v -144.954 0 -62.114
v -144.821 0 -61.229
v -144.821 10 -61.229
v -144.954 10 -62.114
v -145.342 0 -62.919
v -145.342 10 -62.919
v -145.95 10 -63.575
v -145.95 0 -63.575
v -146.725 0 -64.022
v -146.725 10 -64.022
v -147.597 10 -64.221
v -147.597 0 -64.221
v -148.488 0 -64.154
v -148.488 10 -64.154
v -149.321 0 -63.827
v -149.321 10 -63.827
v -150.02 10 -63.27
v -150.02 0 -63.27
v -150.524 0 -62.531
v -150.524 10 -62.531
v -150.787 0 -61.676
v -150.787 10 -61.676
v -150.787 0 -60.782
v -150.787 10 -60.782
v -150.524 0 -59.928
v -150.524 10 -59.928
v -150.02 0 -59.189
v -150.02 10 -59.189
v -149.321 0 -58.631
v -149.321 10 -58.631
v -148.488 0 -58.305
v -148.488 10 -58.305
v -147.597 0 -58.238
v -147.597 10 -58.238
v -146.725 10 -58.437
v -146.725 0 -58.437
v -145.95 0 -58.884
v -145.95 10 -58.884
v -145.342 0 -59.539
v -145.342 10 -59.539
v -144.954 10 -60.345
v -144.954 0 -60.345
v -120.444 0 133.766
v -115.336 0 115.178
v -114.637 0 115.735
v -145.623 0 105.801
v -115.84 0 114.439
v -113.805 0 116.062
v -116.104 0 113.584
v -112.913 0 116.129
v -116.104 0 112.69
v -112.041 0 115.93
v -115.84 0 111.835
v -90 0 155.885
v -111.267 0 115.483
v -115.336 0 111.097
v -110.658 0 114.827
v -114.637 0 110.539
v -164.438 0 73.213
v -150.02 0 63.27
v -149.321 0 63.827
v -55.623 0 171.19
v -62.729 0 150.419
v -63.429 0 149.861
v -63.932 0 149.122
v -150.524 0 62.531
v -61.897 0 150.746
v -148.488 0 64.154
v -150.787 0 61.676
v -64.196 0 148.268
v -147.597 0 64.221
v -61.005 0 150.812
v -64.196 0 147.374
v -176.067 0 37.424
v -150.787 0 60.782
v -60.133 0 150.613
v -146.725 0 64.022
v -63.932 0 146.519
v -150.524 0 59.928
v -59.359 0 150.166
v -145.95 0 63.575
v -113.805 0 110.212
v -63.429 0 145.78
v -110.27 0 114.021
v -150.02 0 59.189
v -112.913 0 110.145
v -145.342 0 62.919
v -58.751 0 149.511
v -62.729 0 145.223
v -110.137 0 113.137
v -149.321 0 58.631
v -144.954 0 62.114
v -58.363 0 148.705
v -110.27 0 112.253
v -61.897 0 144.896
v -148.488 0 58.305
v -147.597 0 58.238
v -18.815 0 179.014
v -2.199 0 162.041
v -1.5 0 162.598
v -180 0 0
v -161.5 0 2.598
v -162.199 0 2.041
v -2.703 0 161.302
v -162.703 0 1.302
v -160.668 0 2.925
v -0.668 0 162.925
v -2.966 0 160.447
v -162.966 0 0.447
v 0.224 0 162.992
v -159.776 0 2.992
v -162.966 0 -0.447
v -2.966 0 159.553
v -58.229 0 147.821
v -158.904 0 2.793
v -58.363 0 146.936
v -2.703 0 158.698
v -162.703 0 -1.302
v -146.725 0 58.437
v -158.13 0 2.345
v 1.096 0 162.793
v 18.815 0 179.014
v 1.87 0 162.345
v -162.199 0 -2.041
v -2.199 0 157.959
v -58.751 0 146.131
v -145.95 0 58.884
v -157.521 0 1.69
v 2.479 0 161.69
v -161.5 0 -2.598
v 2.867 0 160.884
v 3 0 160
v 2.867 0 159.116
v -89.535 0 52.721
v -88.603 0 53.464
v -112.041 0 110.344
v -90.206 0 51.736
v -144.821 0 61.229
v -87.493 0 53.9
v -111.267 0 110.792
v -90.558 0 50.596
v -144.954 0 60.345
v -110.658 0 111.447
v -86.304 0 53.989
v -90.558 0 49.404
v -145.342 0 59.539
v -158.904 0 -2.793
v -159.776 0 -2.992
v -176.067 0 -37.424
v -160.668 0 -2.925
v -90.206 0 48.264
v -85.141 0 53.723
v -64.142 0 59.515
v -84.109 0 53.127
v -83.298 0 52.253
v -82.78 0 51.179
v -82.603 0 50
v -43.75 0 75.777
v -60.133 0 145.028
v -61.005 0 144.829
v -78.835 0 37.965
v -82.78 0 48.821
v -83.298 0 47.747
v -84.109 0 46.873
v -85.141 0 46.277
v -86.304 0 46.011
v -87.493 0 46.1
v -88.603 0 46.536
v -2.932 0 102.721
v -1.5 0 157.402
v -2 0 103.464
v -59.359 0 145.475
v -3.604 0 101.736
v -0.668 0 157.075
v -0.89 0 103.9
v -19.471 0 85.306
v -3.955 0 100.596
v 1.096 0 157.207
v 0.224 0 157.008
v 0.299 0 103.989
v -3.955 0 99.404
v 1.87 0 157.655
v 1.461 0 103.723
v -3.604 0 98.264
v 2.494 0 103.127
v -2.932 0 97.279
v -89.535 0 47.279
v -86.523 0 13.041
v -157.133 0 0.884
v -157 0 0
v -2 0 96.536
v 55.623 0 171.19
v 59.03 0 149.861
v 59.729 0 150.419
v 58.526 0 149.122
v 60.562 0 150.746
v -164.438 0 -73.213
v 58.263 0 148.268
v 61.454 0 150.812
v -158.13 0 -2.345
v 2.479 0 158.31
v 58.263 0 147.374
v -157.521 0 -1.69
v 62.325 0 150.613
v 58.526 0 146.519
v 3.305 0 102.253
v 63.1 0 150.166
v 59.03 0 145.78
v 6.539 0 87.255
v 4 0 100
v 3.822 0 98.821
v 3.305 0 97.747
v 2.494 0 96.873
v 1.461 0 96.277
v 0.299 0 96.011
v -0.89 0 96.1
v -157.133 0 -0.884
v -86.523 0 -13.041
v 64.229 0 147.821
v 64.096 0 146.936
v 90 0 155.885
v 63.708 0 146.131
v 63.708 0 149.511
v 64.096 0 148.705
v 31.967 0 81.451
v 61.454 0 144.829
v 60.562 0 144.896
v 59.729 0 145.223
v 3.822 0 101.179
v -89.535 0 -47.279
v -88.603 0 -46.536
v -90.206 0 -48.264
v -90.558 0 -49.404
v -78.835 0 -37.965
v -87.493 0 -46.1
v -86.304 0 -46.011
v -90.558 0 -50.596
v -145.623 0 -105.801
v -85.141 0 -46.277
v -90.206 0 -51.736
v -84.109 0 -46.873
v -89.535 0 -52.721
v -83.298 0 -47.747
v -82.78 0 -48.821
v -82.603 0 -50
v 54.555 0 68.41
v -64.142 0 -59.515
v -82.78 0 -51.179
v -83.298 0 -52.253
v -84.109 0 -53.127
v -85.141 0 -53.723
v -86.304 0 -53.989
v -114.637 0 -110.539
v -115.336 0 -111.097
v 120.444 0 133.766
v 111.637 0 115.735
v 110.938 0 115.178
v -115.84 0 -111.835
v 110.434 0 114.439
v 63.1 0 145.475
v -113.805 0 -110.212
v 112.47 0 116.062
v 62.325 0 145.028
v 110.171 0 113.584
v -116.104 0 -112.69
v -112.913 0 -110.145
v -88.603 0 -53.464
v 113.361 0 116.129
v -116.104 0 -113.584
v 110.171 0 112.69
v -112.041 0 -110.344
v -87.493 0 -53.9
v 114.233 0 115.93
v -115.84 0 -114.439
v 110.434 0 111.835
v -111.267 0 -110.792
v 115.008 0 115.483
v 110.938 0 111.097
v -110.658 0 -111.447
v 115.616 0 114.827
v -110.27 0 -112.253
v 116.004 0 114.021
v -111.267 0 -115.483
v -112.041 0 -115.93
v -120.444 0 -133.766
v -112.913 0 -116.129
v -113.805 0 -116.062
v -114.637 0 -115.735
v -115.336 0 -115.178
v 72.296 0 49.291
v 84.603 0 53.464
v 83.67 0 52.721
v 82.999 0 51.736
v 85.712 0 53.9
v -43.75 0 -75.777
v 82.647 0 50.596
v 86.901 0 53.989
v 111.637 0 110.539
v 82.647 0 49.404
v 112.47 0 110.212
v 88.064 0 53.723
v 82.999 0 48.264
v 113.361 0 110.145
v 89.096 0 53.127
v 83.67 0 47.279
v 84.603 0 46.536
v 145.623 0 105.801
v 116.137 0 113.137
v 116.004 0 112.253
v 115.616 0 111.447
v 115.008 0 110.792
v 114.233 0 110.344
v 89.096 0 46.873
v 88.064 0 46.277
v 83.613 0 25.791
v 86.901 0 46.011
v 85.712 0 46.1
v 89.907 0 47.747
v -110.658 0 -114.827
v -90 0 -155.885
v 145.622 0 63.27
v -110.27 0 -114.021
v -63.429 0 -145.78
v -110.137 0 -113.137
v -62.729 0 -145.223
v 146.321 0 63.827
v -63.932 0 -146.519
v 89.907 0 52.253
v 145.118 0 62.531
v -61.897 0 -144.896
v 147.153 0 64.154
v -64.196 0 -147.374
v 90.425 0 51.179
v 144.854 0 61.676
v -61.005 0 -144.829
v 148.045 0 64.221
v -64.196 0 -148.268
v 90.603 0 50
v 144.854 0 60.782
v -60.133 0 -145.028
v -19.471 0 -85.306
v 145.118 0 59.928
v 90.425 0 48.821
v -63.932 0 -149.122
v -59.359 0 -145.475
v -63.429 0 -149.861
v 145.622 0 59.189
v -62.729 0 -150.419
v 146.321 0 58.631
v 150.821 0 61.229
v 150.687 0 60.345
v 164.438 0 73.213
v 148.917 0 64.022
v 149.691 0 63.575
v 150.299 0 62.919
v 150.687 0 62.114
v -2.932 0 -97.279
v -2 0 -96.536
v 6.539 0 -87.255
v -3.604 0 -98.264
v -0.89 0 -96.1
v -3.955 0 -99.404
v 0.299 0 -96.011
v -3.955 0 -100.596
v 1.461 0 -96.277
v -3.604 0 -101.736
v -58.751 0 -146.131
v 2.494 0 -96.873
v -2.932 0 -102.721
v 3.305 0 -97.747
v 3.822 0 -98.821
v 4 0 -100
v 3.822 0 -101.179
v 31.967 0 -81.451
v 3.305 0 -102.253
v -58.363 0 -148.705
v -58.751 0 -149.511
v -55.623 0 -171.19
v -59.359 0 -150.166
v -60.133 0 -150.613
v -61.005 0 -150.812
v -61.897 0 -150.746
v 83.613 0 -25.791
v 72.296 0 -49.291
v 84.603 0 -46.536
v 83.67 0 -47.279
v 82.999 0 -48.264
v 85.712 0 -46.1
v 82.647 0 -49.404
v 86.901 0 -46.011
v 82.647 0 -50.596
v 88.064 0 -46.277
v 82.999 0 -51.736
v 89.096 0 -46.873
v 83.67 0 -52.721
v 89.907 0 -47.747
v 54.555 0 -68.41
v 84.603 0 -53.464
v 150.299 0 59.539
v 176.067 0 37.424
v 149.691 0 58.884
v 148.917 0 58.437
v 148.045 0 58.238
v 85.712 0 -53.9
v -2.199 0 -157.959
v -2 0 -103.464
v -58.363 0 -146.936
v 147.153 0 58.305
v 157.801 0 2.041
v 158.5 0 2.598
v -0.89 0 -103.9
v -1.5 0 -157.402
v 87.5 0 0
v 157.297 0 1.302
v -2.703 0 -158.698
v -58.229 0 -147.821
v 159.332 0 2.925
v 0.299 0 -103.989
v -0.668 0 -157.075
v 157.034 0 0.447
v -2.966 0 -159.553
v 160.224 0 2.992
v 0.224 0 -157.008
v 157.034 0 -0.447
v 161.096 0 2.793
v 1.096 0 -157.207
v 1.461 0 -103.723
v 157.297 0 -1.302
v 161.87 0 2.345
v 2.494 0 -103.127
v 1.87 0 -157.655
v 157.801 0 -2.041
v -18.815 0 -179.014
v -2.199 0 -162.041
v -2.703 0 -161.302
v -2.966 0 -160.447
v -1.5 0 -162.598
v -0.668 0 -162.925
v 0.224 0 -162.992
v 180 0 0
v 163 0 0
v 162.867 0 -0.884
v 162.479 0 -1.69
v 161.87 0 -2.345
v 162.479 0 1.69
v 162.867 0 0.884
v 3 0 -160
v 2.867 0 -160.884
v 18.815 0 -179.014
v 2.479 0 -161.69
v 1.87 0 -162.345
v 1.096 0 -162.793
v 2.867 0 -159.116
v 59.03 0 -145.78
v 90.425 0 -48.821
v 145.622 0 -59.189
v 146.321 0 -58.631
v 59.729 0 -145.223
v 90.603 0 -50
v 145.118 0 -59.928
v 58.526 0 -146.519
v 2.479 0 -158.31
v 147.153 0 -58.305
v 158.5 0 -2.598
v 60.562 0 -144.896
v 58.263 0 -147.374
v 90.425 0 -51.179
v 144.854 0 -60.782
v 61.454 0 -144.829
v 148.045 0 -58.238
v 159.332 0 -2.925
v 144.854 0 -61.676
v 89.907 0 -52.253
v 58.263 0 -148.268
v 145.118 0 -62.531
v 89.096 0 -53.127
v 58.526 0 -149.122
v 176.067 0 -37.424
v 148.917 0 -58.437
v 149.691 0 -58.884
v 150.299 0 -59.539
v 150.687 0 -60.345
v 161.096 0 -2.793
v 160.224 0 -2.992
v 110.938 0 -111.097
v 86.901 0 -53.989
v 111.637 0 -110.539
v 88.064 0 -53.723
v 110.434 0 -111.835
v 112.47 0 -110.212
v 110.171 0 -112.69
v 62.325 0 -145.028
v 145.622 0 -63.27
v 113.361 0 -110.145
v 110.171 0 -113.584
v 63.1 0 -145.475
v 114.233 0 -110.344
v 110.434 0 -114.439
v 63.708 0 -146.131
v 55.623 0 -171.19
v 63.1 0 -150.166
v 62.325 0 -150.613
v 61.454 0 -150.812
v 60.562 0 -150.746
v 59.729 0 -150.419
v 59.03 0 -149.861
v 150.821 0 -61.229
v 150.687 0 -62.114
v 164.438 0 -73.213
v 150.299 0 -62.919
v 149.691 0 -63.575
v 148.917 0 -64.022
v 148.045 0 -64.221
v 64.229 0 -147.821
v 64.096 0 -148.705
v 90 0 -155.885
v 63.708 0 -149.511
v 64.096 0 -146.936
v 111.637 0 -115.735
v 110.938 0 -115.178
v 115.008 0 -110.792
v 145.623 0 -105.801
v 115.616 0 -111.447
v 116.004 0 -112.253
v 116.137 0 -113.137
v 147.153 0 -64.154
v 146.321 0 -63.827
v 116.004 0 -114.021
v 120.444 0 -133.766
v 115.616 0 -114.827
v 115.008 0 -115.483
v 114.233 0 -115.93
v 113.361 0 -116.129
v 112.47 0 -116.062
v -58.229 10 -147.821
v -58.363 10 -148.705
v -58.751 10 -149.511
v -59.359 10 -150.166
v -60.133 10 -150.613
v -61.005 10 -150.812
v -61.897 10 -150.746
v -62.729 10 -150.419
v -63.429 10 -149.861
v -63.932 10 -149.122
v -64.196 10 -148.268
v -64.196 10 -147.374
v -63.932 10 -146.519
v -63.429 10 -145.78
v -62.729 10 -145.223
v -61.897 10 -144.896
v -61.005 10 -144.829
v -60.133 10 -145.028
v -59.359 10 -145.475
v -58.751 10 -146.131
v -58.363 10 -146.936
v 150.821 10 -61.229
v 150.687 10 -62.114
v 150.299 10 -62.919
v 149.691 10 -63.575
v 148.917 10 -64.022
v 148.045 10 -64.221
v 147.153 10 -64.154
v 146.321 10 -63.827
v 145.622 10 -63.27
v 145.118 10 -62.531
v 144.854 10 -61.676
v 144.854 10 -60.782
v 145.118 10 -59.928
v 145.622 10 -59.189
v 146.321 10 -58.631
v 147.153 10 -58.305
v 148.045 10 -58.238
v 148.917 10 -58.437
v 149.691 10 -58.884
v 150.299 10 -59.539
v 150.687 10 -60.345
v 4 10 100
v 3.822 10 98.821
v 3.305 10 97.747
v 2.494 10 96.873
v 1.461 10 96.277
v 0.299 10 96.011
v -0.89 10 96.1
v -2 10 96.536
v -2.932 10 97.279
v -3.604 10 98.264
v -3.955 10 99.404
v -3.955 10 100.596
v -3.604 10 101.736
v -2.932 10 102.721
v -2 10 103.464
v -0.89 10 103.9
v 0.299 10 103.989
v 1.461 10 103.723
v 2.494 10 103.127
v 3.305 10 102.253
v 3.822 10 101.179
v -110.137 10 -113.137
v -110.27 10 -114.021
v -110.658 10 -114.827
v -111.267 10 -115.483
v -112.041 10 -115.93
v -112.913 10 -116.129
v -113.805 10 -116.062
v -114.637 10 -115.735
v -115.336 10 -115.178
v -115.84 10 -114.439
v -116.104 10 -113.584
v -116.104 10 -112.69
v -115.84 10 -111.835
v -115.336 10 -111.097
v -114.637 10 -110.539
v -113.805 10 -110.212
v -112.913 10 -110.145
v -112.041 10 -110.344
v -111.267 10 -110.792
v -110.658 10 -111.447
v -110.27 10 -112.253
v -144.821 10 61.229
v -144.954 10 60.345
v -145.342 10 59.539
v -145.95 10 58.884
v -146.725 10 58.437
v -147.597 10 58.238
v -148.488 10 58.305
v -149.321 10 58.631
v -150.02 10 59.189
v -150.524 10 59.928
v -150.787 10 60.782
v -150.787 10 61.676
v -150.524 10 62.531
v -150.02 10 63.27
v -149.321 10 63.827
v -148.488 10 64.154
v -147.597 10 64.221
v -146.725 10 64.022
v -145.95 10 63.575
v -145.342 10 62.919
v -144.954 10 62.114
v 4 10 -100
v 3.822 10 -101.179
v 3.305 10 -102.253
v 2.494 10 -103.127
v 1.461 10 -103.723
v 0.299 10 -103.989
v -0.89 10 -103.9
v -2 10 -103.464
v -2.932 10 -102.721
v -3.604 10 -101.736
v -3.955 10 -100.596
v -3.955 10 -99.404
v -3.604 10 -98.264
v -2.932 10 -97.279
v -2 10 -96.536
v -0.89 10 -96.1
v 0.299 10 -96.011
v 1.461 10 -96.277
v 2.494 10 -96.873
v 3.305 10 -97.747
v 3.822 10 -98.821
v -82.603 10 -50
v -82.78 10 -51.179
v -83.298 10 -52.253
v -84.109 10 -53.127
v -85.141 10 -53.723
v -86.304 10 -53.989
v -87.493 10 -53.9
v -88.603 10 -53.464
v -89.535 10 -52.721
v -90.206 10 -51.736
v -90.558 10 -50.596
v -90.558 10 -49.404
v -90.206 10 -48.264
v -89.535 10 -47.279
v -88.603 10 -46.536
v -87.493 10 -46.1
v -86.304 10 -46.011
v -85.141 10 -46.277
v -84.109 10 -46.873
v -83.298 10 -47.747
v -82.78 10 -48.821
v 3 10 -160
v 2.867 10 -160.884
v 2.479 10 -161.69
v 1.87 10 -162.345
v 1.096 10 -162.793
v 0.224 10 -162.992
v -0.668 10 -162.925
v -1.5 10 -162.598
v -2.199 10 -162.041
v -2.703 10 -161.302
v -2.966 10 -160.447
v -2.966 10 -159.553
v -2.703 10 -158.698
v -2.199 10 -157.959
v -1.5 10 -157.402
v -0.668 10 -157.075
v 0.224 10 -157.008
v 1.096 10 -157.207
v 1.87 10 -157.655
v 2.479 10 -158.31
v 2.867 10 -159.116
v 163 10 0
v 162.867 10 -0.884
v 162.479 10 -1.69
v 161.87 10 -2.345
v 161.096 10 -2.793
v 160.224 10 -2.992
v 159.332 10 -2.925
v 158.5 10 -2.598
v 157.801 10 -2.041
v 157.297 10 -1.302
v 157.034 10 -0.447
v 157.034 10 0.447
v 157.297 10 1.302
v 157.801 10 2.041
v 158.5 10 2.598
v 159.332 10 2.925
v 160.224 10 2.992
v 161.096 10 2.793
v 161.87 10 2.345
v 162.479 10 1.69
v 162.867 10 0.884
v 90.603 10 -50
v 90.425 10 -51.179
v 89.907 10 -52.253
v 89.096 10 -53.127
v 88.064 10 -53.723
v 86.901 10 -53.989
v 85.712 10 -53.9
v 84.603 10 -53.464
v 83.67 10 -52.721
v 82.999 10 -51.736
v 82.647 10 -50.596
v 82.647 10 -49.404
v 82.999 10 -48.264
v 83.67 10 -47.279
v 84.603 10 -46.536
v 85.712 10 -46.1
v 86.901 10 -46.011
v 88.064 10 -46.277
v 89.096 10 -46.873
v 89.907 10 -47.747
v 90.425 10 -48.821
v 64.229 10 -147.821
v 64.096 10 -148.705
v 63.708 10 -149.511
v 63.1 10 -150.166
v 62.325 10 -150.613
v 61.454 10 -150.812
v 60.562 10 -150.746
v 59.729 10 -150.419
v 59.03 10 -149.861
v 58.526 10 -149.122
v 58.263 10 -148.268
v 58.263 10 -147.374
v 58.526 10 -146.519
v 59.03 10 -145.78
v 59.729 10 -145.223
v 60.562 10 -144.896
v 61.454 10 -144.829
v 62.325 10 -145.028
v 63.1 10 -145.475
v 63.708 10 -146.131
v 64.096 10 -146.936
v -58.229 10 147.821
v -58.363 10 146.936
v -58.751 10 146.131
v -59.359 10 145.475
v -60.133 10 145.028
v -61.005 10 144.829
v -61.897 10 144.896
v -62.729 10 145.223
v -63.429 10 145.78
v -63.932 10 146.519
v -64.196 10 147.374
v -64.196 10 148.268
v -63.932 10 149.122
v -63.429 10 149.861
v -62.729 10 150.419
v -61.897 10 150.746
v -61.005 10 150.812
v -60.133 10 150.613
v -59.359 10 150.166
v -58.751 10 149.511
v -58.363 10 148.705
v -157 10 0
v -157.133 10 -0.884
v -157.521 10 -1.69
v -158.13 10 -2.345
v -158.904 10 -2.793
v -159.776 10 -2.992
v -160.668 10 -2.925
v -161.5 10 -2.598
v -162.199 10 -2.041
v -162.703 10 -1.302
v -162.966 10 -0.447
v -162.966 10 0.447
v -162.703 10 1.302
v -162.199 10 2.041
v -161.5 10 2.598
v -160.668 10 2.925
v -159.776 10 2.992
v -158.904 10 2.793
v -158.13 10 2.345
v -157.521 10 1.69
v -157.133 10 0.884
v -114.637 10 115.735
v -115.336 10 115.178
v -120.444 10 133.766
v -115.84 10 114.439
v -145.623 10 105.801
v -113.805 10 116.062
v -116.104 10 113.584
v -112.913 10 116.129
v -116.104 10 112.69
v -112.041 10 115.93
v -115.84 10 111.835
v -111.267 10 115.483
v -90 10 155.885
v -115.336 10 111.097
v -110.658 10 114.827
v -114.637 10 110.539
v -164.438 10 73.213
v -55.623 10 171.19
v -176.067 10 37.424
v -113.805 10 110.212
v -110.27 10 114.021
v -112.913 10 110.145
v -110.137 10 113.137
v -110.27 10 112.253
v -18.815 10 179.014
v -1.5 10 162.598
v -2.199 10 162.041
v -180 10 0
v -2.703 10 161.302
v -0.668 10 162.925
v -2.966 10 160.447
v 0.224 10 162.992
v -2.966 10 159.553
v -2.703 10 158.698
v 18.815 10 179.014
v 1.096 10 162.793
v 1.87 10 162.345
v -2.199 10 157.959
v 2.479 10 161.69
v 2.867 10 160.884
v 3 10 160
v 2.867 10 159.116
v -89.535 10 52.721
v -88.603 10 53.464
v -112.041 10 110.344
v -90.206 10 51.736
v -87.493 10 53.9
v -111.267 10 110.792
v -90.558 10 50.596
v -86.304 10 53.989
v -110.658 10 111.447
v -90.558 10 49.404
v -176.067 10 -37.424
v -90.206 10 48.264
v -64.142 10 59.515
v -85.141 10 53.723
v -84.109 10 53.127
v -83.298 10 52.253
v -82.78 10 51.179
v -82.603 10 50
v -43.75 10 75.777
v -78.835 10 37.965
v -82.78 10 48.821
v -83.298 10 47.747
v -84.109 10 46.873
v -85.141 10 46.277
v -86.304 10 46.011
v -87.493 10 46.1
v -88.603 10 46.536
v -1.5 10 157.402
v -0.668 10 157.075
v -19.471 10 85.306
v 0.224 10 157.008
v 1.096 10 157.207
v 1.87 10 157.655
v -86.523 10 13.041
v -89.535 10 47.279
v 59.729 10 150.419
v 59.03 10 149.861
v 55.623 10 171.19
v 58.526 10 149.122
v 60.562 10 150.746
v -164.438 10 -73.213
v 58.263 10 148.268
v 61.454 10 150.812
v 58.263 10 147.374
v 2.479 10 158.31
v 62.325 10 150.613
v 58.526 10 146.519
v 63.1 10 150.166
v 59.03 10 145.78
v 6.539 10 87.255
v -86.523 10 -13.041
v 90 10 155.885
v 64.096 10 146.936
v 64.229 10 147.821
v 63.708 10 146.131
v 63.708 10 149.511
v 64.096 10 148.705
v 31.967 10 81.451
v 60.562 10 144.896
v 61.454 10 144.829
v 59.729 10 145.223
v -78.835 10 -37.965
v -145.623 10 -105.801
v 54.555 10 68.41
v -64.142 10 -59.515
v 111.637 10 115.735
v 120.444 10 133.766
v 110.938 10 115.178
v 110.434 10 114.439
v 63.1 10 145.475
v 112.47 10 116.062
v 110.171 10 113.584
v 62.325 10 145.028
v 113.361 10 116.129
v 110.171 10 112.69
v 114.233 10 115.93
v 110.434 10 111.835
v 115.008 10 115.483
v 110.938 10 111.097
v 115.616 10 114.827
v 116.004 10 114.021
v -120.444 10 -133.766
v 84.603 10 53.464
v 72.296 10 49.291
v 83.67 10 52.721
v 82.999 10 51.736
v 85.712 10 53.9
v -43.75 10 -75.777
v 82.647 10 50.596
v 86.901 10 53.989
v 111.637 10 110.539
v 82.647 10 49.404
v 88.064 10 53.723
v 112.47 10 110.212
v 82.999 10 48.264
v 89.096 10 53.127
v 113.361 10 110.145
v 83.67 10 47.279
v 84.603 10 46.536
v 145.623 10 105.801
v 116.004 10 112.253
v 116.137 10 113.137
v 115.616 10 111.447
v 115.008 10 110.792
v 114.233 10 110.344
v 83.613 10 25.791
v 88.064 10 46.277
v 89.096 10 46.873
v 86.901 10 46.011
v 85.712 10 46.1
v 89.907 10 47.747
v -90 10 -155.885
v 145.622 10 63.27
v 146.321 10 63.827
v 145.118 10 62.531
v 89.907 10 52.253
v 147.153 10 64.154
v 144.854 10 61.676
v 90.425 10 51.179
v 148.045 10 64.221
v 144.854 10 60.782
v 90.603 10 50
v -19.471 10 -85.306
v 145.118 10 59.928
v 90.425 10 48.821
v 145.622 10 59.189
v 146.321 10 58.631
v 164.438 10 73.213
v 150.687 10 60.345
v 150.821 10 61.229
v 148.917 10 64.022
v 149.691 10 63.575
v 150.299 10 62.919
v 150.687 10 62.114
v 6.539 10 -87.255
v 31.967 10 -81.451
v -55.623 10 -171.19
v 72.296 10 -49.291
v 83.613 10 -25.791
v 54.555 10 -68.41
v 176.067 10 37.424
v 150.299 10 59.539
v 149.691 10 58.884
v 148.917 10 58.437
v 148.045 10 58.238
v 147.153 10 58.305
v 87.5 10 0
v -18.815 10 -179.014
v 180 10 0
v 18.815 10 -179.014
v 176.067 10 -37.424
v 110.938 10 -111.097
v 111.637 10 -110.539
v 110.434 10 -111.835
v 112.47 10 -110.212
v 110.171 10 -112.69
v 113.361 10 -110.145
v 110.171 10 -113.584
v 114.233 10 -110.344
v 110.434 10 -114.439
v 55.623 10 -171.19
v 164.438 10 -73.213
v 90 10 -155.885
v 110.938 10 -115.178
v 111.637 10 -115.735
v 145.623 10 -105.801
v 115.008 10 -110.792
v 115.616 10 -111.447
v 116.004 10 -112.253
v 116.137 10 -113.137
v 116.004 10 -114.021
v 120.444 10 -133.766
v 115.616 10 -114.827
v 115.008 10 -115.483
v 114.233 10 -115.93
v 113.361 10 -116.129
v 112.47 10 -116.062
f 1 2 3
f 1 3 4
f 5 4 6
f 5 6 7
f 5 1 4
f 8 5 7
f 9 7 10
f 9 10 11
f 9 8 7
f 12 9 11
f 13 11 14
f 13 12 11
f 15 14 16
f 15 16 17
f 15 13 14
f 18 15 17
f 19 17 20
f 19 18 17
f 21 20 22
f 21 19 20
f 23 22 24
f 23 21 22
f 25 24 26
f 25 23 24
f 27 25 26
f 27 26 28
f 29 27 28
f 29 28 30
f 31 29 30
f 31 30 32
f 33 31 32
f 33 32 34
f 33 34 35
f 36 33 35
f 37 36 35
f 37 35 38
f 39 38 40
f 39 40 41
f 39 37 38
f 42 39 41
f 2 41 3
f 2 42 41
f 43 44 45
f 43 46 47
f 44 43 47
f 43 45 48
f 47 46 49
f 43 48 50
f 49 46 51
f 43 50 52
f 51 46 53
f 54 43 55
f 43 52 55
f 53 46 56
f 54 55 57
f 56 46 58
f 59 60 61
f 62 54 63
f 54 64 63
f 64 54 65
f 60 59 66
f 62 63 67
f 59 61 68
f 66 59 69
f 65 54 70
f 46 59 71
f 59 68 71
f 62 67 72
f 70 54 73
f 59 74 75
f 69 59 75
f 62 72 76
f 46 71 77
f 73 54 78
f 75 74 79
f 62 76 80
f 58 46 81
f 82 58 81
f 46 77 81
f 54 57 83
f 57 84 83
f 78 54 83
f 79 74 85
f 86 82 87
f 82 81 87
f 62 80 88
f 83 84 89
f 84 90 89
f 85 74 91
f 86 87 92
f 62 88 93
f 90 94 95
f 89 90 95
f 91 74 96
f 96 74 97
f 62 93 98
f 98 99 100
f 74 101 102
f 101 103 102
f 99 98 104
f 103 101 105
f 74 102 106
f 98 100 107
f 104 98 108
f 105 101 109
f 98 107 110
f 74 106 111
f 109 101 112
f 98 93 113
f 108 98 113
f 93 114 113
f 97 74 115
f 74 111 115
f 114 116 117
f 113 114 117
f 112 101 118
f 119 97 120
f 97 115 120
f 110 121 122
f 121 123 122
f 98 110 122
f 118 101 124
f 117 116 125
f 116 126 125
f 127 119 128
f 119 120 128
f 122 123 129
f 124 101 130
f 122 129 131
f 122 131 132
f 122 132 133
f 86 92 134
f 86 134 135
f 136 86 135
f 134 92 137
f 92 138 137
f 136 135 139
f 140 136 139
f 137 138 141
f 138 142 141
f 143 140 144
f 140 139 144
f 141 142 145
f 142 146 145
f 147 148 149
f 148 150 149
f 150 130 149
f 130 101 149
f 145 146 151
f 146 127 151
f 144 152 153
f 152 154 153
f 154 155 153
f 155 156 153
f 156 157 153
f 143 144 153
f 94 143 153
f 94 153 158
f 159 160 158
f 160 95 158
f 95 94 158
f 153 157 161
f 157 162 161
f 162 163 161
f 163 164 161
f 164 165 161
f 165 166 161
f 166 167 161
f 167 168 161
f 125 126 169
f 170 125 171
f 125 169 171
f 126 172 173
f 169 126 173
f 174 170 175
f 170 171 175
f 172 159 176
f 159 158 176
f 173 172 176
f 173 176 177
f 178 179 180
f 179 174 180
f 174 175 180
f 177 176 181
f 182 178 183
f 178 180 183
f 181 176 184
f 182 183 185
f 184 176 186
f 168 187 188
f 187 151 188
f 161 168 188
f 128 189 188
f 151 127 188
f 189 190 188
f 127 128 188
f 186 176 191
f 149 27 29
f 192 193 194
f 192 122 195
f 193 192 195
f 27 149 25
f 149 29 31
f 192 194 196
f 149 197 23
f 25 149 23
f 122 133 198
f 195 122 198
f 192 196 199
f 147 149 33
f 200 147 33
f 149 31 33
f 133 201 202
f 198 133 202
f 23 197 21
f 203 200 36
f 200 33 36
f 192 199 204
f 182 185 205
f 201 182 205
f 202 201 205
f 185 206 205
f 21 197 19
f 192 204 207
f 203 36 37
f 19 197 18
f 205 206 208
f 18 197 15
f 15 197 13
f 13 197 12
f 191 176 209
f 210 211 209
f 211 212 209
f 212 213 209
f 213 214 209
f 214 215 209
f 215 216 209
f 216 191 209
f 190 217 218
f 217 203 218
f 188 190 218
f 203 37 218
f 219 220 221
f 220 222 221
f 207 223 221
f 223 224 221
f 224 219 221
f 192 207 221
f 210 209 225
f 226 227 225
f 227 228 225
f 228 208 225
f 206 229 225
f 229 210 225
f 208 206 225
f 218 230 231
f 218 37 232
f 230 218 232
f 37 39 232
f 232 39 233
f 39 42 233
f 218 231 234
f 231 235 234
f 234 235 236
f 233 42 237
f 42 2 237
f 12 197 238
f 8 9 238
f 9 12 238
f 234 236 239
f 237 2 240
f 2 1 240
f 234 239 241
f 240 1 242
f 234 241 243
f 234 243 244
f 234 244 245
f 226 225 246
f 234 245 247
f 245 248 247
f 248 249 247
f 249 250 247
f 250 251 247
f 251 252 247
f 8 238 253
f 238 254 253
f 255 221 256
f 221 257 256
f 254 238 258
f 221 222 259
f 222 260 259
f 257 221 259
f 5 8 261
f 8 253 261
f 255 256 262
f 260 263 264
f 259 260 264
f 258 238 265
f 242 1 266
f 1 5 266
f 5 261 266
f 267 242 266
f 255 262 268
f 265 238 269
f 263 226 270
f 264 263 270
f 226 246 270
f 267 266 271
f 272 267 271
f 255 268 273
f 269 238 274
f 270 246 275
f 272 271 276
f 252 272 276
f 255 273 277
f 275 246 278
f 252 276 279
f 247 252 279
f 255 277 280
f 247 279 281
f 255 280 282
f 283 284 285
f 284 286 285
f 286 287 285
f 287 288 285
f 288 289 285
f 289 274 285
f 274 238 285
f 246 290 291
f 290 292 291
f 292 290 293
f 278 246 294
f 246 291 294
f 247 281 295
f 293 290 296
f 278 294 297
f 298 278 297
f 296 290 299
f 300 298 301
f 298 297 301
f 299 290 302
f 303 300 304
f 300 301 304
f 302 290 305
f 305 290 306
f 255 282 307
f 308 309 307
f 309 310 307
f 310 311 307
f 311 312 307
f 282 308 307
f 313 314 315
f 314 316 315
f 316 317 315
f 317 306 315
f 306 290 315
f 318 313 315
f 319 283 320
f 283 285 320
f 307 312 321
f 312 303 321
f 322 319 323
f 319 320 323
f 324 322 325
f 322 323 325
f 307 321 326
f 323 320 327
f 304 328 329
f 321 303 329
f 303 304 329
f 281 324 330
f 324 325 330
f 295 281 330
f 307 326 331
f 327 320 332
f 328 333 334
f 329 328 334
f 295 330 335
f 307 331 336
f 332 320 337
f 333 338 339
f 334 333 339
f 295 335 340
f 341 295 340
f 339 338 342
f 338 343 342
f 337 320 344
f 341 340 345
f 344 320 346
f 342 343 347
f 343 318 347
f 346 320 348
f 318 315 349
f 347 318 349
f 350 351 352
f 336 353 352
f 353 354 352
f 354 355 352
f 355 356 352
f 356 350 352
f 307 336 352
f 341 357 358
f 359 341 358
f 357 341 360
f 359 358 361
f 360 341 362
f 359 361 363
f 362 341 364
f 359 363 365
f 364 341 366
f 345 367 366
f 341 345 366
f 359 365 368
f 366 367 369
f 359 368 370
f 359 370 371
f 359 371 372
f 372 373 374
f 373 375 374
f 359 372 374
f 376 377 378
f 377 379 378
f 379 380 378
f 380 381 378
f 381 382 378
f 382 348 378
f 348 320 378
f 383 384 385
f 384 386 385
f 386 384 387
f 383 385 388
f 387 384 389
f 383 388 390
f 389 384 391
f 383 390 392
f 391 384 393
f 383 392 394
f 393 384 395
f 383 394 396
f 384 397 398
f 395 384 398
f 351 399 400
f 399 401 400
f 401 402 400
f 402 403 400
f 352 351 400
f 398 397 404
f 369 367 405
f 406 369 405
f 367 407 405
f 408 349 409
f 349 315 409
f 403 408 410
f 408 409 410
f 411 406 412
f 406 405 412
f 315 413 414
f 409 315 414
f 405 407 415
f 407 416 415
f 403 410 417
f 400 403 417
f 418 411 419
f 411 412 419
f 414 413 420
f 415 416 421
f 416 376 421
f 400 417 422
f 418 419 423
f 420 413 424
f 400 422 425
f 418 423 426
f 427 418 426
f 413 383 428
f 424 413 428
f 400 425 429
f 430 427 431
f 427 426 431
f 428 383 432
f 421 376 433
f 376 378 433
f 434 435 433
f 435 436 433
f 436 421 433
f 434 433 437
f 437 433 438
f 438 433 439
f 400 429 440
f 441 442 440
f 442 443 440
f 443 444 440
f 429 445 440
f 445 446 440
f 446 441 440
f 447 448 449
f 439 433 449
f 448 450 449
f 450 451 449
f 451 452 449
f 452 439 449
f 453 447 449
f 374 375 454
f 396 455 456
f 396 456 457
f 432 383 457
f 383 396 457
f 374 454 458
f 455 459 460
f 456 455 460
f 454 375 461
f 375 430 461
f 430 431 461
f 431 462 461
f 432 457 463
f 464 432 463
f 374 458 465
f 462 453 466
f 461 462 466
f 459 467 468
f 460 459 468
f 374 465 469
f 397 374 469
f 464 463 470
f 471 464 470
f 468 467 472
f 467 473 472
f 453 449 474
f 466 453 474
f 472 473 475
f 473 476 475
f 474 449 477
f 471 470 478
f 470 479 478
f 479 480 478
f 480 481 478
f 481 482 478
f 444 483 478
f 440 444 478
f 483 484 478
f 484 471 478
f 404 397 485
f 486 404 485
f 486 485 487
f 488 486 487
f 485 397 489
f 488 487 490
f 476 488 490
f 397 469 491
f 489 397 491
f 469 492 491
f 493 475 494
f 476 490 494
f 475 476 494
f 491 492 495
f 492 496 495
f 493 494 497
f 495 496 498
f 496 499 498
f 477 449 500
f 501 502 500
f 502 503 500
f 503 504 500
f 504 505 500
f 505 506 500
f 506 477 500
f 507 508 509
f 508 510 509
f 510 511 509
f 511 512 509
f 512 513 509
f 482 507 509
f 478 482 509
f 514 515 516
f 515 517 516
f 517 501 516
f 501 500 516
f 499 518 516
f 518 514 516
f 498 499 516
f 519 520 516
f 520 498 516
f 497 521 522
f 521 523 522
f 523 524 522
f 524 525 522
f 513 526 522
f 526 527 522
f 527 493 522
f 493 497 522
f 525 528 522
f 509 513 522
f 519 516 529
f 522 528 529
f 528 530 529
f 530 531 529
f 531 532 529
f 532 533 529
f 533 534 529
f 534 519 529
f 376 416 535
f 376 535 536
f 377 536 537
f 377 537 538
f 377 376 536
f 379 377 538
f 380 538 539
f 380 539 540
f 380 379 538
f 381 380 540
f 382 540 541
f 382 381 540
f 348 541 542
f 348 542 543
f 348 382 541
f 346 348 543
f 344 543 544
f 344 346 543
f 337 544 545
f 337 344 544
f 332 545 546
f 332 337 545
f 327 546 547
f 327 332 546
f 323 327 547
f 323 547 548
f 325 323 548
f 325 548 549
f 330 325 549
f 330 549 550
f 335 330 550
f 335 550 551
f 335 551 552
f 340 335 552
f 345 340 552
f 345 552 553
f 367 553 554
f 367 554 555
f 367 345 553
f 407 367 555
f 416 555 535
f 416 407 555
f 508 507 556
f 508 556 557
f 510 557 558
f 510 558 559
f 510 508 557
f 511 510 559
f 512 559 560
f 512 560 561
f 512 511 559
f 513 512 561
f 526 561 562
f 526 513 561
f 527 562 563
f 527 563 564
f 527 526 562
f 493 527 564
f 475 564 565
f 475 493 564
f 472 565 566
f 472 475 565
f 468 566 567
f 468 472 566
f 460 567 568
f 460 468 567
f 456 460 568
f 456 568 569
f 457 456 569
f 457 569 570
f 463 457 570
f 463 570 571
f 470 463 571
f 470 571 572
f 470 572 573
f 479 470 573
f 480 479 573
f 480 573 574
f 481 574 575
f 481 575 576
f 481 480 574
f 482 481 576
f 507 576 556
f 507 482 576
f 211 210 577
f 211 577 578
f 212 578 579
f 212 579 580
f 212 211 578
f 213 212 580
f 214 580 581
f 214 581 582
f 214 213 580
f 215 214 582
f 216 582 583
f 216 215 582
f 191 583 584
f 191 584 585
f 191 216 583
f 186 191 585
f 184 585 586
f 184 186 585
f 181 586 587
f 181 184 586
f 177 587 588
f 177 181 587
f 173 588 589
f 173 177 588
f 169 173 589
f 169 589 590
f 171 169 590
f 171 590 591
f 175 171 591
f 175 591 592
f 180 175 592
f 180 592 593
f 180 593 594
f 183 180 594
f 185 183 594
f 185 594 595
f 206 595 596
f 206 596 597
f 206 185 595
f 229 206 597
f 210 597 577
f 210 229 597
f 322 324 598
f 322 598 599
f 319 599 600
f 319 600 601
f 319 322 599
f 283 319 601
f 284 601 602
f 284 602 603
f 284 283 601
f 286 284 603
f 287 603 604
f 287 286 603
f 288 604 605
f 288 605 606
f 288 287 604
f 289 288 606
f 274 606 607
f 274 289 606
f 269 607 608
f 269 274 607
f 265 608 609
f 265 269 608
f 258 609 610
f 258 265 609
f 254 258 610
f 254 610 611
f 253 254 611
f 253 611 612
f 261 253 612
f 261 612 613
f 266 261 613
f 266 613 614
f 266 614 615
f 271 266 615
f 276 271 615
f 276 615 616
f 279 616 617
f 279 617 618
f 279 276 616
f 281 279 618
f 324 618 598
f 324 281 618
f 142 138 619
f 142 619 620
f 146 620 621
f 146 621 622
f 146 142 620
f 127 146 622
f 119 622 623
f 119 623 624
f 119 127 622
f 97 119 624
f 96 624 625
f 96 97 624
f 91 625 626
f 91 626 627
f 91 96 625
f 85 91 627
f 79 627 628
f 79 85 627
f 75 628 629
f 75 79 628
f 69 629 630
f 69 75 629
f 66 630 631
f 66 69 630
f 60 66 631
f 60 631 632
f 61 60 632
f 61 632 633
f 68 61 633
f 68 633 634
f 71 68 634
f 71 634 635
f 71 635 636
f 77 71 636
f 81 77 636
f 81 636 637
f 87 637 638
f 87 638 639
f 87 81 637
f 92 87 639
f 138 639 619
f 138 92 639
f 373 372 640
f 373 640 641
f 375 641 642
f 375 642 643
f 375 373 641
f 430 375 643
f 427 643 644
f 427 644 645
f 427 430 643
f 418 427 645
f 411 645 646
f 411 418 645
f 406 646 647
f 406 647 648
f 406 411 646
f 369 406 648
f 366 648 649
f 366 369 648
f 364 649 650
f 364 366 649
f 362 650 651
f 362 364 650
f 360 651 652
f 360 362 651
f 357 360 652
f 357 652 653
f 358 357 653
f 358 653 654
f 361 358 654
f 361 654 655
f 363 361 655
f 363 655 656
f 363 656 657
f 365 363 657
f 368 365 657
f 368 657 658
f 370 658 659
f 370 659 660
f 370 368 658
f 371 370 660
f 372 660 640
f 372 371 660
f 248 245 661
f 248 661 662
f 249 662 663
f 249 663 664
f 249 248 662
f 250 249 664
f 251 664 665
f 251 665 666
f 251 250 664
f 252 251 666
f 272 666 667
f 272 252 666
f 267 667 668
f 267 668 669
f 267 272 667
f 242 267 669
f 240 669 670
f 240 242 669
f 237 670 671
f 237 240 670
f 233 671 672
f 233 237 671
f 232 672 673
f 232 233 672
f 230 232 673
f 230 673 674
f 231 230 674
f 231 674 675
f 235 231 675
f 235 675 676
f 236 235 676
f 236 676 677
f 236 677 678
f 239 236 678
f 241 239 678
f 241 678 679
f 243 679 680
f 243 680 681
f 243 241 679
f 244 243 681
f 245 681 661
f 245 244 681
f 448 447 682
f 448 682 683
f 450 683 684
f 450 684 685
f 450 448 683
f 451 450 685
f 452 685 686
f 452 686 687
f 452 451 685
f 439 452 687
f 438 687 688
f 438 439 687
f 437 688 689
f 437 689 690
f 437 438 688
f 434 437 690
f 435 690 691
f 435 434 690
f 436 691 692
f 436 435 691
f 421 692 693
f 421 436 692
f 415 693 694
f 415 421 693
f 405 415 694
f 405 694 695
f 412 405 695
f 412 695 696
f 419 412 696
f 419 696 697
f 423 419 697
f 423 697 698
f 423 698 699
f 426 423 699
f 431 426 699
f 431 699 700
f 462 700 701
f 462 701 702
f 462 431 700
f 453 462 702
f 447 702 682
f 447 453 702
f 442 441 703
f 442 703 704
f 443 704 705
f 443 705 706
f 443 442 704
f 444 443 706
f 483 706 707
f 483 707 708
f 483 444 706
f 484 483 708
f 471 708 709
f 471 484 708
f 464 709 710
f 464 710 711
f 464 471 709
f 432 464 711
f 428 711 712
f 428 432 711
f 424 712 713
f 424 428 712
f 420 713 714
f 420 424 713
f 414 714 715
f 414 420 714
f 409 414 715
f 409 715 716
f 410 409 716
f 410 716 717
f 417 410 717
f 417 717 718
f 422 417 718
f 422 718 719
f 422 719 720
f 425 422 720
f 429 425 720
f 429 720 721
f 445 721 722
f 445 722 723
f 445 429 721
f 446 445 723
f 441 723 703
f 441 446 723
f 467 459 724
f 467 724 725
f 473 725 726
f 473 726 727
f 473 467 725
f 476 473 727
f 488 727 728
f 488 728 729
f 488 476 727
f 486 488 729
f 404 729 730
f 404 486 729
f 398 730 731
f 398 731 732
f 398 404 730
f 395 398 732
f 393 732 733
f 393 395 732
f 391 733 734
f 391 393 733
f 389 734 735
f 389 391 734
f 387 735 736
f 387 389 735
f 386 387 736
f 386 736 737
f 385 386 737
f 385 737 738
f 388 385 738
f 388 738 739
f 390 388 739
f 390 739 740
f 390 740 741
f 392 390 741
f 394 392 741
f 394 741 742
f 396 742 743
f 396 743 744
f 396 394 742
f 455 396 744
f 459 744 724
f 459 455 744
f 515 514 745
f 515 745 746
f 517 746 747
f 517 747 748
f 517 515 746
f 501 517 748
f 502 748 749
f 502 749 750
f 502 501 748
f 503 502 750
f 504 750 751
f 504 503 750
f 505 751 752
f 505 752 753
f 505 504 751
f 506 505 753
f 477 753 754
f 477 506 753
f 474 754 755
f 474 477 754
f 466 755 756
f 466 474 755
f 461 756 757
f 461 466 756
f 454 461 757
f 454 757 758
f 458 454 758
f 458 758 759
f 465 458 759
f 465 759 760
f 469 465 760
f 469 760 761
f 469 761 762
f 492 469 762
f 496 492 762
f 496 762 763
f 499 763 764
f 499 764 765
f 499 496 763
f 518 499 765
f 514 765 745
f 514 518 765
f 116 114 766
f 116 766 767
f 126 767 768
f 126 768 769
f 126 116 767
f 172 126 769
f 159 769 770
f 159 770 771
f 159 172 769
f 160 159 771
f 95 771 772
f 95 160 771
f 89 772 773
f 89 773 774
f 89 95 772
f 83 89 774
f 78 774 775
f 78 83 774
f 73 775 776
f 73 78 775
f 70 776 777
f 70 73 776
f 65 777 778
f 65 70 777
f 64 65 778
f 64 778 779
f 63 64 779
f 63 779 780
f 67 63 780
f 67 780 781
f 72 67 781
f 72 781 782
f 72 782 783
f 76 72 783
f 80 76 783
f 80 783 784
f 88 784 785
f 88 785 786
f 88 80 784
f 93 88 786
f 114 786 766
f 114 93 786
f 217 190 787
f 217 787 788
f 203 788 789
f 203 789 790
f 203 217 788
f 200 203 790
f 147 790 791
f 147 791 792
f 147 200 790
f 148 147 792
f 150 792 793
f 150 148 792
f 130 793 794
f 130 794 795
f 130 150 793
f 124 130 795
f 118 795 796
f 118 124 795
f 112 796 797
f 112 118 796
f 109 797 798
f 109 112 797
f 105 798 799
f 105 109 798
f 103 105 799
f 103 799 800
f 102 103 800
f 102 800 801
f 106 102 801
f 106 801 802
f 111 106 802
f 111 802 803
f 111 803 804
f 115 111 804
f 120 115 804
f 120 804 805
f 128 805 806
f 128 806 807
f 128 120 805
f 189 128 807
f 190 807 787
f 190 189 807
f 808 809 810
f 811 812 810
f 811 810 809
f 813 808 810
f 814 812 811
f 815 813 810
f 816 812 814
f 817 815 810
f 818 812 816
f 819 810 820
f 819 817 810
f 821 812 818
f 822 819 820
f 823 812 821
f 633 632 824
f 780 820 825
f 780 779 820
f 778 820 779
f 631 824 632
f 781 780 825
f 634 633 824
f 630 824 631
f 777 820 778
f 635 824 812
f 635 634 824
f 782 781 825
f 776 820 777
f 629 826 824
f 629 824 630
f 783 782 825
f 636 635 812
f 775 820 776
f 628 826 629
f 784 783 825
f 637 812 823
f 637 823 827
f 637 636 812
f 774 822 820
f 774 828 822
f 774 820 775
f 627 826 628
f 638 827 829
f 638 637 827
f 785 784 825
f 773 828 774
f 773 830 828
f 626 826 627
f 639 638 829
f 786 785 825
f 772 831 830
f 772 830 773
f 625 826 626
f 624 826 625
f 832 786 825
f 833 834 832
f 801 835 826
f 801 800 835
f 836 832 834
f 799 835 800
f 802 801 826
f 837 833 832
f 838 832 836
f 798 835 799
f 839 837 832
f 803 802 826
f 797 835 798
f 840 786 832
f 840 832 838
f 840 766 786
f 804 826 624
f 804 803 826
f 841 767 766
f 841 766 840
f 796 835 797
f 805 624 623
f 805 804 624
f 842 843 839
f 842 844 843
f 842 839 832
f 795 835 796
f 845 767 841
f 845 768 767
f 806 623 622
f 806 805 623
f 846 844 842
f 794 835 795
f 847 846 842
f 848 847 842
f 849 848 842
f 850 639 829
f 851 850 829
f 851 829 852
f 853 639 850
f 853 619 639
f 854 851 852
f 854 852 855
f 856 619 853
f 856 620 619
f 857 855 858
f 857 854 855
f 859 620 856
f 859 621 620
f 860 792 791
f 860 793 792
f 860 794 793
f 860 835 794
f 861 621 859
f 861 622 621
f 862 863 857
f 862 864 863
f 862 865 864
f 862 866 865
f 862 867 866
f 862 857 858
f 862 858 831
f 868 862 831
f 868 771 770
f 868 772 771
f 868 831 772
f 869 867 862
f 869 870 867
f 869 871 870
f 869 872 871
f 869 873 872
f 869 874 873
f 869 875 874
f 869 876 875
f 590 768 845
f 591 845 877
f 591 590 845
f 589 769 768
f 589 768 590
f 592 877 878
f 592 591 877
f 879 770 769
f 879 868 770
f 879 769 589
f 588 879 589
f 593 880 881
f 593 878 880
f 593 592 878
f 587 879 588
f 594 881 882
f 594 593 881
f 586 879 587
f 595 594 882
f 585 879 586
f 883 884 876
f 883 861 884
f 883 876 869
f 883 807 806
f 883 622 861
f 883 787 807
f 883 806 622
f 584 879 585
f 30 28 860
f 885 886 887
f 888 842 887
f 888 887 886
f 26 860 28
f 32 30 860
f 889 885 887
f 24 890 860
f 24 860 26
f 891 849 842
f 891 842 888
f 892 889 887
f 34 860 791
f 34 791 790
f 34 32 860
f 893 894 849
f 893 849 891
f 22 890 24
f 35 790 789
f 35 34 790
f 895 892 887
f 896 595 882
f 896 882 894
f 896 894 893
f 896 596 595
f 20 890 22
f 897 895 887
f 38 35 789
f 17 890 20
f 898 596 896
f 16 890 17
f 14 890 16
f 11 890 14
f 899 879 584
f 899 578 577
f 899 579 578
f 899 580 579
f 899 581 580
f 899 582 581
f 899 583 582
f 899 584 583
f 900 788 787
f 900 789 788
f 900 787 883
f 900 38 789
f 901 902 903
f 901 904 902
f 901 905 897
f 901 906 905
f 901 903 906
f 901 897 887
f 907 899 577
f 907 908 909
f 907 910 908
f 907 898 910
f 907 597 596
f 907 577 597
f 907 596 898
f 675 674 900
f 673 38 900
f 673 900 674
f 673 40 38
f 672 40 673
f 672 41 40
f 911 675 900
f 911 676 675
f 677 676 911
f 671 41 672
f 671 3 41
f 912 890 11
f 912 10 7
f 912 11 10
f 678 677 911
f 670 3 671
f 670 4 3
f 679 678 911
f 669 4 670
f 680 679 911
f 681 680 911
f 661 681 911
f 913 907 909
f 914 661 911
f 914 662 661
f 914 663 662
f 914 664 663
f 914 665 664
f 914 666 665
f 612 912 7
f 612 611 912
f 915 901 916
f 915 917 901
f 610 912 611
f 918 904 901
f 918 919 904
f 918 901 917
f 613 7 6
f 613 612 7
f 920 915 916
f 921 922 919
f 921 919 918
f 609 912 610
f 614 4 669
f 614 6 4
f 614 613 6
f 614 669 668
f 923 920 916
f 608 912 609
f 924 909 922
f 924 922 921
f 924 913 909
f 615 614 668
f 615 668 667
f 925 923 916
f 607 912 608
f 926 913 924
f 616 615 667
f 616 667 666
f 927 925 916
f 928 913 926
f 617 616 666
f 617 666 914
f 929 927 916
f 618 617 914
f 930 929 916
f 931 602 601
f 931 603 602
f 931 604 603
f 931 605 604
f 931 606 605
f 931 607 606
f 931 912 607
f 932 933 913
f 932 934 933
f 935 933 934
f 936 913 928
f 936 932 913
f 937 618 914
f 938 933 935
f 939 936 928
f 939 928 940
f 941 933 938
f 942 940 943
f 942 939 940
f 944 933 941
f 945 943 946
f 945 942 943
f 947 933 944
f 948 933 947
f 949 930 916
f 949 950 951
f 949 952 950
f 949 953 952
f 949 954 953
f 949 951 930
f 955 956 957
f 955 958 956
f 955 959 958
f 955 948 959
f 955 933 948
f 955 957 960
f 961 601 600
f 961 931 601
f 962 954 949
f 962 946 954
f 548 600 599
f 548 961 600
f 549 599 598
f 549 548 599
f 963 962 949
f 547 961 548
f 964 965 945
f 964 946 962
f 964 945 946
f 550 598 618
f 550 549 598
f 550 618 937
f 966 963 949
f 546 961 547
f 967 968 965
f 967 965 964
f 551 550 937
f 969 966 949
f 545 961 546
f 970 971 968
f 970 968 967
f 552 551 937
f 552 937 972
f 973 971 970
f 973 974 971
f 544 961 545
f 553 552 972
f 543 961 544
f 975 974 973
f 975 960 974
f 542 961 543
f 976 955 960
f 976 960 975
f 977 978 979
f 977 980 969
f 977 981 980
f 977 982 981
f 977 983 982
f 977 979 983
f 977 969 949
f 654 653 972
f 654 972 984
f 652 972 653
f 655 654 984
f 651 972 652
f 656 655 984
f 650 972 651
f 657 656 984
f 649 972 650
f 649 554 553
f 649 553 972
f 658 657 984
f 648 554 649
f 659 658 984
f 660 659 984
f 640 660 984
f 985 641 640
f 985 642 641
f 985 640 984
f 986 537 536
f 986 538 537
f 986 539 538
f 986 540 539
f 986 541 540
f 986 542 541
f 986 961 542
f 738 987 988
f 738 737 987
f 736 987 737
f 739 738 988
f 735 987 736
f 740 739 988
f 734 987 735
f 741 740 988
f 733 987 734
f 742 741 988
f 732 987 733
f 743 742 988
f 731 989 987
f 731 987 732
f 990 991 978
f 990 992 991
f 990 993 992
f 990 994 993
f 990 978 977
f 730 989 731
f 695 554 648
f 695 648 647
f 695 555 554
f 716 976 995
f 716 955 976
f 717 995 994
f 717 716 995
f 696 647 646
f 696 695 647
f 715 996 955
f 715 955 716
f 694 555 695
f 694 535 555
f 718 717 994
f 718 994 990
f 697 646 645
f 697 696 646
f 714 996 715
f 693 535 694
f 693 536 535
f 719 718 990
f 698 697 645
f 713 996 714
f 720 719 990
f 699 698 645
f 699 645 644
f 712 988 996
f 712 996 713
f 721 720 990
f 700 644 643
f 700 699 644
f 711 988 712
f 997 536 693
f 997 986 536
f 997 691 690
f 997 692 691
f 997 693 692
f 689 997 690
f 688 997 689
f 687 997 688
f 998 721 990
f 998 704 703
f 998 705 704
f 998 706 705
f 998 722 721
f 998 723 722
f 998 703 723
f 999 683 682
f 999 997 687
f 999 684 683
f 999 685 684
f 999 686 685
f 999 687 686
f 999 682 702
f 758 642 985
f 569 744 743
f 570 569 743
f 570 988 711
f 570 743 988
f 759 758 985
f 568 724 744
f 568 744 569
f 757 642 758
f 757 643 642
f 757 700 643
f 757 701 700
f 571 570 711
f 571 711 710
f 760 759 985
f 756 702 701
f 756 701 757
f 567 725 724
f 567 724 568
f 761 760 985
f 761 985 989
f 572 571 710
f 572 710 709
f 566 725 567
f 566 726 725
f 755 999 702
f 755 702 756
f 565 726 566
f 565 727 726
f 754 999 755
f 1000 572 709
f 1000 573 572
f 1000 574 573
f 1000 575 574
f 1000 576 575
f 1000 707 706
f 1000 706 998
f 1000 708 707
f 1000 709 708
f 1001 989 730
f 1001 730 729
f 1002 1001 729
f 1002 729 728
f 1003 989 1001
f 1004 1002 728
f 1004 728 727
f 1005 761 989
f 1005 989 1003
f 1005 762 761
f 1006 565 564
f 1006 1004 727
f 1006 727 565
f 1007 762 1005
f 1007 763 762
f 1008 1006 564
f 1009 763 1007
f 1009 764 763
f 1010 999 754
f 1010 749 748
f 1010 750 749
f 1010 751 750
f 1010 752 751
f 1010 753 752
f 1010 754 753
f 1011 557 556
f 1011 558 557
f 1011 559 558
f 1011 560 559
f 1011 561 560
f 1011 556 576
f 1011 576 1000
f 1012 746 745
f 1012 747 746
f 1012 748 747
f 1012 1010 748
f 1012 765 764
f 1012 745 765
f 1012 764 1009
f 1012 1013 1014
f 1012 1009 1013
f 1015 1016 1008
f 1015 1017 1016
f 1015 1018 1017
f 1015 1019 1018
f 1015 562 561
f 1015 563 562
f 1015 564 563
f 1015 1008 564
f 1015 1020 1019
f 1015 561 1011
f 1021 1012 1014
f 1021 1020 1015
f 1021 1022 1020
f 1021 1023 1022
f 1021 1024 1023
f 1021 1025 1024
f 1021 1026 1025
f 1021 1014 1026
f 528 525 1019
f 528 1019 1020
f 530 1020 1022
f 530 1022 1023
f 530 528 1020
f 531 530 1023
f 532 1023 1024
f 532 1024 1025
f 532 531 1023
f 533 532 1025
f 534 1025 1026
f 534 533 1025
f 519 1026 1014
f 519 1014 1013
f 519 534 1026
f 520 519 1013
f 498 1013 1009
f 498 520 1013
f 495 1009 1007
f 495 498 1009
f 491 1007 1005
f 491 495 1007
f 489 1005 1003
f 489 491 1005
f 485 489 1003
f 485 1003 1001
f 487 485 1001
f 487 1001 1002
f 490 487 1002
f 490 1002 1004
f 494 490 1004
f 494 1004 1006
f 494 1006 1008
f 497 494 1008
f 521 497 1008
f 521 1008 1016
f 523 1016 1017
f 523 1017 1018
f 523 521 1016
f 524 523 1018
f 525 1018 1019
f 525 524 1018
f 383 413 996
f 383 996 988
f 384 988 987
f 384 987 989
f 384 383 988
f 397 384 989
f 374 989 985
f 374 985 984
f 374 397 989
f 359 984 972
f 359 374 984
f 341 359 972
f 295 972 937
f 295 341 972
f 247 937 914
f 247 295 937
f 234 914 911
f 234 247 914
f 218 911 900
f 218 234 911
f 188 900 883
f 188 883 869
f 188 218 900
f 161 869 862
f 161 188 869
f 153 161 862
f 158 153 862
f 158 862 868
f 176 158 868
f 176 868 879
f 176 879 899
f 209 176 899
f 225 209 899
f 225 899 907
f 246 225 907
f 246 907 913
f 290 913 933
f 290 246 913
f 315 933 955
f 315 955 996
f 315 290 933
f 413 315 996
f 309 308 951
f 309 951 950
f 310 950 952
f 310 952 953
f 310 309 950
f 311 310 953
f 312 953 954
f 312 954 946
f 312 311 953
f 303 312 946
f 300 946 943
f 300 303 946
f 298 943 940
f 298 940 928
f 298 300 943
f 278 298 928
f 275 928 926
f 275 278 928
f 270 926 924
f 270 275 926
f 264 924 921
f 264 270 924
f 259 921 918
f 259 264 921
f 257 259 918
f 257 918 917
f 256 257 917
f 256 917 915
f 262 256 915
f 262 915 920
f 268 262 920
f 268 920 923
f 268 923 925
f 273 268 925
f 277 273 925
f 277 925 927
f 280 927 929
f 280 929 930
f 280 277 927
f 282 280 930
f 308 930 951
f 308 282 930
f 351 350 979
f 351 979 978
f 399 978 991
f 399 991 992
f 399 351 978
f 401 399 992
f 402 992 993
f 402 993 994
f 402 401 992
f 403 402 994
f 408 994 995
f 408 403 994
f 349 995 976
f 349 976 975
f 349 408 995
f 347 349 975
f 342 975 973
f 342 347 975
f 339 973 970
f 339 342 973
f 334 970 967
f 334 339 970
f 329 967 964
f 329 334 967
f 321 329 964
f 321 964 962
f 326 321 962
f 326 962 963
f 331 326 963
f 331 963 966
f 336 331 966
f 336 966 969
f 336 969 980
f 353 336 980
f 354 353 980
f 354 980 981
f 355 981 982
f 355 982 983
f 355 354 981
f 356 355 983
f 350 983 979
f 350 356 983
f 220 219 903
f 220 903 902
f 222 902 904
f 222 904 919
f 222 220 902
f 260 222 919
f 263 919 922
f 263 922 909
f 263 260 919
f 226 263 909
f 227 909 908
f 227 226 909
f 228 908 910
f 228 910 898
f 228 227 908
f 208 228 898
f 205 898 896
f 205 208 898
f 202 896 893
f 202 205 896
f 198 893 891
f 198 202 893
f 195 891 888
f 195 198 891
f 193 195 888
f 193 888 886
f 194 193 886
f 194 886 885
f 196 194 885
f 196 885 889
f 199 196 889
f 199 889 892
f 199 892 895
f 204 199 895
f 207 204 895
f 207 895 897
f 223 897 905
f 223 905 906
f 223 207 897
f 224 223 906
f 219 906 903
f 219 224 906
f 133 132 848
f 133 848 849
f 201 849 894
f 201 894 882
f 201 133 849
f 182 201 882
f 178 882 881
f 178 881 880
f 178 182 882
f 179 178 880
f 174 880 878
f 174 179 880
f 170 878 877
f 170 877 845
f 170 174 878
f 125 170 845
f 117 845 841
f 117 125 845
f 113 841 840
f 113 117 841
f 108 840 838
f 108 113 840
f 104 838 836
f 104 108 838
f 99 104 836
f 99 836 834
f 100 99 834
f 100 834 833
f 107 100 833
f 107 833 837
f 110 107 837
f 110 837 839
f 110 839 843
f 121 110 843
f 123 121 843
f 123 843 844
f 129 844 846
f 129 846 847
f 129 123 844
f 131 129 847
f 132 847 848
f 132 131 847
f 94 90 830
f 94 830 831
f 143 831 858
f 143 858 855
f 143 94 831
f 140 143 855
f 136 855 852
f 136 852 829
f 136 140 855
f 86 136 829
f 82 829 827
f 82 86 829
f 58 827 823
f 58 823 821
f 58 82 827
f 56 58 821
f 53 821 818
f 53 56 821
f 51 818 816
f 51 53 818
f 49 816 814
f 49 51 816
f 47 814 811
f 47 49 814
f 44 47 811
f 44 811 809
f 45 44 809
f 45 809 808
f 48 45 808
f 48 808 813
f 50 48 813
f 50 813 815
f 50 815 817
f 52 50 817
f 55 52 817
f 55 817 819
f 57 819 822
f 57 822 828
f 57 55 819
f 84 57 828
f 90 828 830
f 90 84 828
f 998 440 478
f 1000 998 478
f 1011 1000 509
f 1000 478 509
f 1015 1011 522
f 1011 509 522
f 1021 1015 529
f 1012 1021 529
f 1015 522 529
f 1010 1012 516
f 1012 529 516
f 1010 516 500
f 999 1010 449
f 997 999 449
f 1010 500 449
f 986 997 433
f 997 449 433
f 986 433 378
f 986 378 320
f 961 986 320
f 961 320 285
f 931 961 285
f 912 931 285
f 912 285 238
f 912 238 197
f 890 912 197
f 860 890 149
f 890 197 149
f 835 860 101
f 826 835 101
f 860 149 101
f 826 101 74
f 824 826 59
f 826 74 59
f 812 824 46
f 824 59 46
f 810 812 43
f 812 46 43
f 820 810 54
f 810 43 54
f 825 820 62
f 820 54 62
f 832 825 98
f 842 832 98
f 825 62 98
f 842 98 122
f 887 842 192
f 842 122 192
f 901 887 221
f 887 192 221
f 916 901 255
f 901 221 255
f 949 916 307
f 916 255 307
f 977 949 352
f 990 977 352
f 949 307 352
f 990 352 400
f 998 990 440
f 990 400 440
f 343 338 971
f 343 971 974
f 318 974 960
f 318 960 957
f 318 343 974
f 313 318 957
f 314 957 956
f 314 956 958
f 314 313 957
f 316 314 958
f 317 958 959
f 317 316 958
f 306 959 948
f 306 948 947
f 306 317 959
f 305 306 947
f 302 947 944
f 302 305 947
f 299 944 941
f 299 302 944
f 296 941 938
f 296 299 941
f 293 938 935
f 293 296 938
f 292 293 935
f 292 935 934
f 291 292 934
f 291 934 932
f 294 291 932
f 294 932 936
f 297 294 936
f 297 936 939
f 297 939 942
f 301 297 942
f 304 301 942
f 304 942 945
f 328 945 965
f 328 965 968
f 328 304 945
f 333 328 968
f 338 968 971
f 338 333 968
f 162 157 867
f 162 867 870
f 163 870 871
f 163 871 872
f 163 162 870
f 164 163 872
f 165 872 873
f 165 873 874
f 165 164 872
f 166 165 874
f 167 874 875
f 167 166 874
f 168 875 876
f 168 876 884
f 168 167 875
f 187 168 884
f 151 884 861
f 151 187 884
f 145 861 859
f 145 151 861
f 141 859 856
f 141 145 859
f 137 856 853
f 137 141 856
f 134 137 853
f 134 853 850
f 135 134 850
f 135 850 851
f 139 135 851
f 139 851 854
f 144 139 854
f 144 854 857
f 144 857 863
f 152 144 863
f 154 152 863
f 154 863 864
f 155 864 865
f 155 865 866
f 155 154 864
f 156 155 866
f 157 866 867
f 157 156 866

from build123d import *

# Parameters (mm, degrees)
SKETCH1_R           = 180
SKETCH1_R_2         = 87.5
SKETCH1_R_3         = 3
SKETCH1_R_4         = 4
BOSS_EXTRUDE1_DEPTH = 10


with BuildPart() as part:
    # Sketch1 → Boss-Extrude1 (new body)
    with BuildSketch(Plane(origin=(0, 0, 0), x_dir=(1, 0, 0), z_dir=(0, 1, 0))):
        Circle(SKETCH1_R)
        Circle(SKETCH1_R_2, mode=Mode.SUBTRACT)
        with Locations((0, 160)):
            Circle(SKETCH1_R_3, mode=Mode.SUBTRACT)
        with Locations((61.229349178, 147.820725202)):
            Circle(SKETCH1_R_3, mode=Mode.SUBTRACT)
        with Locations((113.13708499, 113.13708499)):
            Circle(SKETCH1_R_3, mode=Mode.SUBTRACT)
        with Locations((147.820725202, 61.229349178)):
            Circle(SKETCH1_R_3, mode=Mode.SUBTRACT)
        with Locations((160, 0)):
            Circle(SKETCH1_R_3, mode=Mode.SUBTRACT)
        with Locations((147.820725202, -61.229349178)):
            Circle(SKETCH1_R_3, mode=Mode.SUBTRACT)
        with Locations((113.13708499, -113.13708499)):
            Circle(SKETCH1_R_3, mode=Mode.SUBTRACT)
        with Locations((61.229349178, -147.820725202)):
            Circle(SKETCH1_R_3, mode=Mode.SUBTRACT)
        with Locations((0, -160)):
            Circle(SKETCH1_R_3, mode=Mode.SUBTRACT)
        with Locations((-61.229349178, -147.820725202)):
            Circle(SKETCH1_R_3, mode=Mode.SUBTRACT)
        with Locations((-113.13708499, -113.13708499)):
            Circle(SKETCH1_R_3, mode=Mode.SUBTRACT)
        with Locations((-147.820725202, -61.229349178)):
            Circle(SKETCH1_R_3, mode=Mode.SUBTRACT)
        with Locations((-160, 0)):
            Circle(SKETCH1_R_3, mode=Mode.SUBTRACT)
        with Locations((-147.820725202, 61.229349178)):
            Circle(SKETCH1_R_3, mode=Mode.SUBTRACT)
        with Locations((-113.13708499, 113.13708499)):
            Circle(SKETCH1_R_3, mode=Mode.SUBTRACT)
        with Locations((-61.229349178, 147.820725202)):
            Circle(SKETCH1_R_3, mode=Mode.SUBTRACT)
        with Locations((0, 100)):
            Circle(SKETCH1_R_4, mode=Mode.SUBTRACT)
        with Locations((86.602540378, 50)):
            Circle(SKETCH1_R_4, mode=Mode.SUBTRACT)
        with Locations((86.602540378, -50)):
            Circle(SKETCH1_R_4, mode=Mode.SUBTRACT)
        with Locations((0, -100)):
            Circle(SKETCH1_R_4, mode=Mode.SUBTRACT)
        with Locations((-86.602540378, -50)):
            Circle(SKETCH1_R_4, mode=Mode.SUBTRACT)
        with Locations((-86.602540378, 50)):
            Circle(SKETCH1_R_4, mode=Mode.SUBTRACT)
    extrude(amount=BOSS_EXTRUDE1_DEPTH)


solid = part.part
